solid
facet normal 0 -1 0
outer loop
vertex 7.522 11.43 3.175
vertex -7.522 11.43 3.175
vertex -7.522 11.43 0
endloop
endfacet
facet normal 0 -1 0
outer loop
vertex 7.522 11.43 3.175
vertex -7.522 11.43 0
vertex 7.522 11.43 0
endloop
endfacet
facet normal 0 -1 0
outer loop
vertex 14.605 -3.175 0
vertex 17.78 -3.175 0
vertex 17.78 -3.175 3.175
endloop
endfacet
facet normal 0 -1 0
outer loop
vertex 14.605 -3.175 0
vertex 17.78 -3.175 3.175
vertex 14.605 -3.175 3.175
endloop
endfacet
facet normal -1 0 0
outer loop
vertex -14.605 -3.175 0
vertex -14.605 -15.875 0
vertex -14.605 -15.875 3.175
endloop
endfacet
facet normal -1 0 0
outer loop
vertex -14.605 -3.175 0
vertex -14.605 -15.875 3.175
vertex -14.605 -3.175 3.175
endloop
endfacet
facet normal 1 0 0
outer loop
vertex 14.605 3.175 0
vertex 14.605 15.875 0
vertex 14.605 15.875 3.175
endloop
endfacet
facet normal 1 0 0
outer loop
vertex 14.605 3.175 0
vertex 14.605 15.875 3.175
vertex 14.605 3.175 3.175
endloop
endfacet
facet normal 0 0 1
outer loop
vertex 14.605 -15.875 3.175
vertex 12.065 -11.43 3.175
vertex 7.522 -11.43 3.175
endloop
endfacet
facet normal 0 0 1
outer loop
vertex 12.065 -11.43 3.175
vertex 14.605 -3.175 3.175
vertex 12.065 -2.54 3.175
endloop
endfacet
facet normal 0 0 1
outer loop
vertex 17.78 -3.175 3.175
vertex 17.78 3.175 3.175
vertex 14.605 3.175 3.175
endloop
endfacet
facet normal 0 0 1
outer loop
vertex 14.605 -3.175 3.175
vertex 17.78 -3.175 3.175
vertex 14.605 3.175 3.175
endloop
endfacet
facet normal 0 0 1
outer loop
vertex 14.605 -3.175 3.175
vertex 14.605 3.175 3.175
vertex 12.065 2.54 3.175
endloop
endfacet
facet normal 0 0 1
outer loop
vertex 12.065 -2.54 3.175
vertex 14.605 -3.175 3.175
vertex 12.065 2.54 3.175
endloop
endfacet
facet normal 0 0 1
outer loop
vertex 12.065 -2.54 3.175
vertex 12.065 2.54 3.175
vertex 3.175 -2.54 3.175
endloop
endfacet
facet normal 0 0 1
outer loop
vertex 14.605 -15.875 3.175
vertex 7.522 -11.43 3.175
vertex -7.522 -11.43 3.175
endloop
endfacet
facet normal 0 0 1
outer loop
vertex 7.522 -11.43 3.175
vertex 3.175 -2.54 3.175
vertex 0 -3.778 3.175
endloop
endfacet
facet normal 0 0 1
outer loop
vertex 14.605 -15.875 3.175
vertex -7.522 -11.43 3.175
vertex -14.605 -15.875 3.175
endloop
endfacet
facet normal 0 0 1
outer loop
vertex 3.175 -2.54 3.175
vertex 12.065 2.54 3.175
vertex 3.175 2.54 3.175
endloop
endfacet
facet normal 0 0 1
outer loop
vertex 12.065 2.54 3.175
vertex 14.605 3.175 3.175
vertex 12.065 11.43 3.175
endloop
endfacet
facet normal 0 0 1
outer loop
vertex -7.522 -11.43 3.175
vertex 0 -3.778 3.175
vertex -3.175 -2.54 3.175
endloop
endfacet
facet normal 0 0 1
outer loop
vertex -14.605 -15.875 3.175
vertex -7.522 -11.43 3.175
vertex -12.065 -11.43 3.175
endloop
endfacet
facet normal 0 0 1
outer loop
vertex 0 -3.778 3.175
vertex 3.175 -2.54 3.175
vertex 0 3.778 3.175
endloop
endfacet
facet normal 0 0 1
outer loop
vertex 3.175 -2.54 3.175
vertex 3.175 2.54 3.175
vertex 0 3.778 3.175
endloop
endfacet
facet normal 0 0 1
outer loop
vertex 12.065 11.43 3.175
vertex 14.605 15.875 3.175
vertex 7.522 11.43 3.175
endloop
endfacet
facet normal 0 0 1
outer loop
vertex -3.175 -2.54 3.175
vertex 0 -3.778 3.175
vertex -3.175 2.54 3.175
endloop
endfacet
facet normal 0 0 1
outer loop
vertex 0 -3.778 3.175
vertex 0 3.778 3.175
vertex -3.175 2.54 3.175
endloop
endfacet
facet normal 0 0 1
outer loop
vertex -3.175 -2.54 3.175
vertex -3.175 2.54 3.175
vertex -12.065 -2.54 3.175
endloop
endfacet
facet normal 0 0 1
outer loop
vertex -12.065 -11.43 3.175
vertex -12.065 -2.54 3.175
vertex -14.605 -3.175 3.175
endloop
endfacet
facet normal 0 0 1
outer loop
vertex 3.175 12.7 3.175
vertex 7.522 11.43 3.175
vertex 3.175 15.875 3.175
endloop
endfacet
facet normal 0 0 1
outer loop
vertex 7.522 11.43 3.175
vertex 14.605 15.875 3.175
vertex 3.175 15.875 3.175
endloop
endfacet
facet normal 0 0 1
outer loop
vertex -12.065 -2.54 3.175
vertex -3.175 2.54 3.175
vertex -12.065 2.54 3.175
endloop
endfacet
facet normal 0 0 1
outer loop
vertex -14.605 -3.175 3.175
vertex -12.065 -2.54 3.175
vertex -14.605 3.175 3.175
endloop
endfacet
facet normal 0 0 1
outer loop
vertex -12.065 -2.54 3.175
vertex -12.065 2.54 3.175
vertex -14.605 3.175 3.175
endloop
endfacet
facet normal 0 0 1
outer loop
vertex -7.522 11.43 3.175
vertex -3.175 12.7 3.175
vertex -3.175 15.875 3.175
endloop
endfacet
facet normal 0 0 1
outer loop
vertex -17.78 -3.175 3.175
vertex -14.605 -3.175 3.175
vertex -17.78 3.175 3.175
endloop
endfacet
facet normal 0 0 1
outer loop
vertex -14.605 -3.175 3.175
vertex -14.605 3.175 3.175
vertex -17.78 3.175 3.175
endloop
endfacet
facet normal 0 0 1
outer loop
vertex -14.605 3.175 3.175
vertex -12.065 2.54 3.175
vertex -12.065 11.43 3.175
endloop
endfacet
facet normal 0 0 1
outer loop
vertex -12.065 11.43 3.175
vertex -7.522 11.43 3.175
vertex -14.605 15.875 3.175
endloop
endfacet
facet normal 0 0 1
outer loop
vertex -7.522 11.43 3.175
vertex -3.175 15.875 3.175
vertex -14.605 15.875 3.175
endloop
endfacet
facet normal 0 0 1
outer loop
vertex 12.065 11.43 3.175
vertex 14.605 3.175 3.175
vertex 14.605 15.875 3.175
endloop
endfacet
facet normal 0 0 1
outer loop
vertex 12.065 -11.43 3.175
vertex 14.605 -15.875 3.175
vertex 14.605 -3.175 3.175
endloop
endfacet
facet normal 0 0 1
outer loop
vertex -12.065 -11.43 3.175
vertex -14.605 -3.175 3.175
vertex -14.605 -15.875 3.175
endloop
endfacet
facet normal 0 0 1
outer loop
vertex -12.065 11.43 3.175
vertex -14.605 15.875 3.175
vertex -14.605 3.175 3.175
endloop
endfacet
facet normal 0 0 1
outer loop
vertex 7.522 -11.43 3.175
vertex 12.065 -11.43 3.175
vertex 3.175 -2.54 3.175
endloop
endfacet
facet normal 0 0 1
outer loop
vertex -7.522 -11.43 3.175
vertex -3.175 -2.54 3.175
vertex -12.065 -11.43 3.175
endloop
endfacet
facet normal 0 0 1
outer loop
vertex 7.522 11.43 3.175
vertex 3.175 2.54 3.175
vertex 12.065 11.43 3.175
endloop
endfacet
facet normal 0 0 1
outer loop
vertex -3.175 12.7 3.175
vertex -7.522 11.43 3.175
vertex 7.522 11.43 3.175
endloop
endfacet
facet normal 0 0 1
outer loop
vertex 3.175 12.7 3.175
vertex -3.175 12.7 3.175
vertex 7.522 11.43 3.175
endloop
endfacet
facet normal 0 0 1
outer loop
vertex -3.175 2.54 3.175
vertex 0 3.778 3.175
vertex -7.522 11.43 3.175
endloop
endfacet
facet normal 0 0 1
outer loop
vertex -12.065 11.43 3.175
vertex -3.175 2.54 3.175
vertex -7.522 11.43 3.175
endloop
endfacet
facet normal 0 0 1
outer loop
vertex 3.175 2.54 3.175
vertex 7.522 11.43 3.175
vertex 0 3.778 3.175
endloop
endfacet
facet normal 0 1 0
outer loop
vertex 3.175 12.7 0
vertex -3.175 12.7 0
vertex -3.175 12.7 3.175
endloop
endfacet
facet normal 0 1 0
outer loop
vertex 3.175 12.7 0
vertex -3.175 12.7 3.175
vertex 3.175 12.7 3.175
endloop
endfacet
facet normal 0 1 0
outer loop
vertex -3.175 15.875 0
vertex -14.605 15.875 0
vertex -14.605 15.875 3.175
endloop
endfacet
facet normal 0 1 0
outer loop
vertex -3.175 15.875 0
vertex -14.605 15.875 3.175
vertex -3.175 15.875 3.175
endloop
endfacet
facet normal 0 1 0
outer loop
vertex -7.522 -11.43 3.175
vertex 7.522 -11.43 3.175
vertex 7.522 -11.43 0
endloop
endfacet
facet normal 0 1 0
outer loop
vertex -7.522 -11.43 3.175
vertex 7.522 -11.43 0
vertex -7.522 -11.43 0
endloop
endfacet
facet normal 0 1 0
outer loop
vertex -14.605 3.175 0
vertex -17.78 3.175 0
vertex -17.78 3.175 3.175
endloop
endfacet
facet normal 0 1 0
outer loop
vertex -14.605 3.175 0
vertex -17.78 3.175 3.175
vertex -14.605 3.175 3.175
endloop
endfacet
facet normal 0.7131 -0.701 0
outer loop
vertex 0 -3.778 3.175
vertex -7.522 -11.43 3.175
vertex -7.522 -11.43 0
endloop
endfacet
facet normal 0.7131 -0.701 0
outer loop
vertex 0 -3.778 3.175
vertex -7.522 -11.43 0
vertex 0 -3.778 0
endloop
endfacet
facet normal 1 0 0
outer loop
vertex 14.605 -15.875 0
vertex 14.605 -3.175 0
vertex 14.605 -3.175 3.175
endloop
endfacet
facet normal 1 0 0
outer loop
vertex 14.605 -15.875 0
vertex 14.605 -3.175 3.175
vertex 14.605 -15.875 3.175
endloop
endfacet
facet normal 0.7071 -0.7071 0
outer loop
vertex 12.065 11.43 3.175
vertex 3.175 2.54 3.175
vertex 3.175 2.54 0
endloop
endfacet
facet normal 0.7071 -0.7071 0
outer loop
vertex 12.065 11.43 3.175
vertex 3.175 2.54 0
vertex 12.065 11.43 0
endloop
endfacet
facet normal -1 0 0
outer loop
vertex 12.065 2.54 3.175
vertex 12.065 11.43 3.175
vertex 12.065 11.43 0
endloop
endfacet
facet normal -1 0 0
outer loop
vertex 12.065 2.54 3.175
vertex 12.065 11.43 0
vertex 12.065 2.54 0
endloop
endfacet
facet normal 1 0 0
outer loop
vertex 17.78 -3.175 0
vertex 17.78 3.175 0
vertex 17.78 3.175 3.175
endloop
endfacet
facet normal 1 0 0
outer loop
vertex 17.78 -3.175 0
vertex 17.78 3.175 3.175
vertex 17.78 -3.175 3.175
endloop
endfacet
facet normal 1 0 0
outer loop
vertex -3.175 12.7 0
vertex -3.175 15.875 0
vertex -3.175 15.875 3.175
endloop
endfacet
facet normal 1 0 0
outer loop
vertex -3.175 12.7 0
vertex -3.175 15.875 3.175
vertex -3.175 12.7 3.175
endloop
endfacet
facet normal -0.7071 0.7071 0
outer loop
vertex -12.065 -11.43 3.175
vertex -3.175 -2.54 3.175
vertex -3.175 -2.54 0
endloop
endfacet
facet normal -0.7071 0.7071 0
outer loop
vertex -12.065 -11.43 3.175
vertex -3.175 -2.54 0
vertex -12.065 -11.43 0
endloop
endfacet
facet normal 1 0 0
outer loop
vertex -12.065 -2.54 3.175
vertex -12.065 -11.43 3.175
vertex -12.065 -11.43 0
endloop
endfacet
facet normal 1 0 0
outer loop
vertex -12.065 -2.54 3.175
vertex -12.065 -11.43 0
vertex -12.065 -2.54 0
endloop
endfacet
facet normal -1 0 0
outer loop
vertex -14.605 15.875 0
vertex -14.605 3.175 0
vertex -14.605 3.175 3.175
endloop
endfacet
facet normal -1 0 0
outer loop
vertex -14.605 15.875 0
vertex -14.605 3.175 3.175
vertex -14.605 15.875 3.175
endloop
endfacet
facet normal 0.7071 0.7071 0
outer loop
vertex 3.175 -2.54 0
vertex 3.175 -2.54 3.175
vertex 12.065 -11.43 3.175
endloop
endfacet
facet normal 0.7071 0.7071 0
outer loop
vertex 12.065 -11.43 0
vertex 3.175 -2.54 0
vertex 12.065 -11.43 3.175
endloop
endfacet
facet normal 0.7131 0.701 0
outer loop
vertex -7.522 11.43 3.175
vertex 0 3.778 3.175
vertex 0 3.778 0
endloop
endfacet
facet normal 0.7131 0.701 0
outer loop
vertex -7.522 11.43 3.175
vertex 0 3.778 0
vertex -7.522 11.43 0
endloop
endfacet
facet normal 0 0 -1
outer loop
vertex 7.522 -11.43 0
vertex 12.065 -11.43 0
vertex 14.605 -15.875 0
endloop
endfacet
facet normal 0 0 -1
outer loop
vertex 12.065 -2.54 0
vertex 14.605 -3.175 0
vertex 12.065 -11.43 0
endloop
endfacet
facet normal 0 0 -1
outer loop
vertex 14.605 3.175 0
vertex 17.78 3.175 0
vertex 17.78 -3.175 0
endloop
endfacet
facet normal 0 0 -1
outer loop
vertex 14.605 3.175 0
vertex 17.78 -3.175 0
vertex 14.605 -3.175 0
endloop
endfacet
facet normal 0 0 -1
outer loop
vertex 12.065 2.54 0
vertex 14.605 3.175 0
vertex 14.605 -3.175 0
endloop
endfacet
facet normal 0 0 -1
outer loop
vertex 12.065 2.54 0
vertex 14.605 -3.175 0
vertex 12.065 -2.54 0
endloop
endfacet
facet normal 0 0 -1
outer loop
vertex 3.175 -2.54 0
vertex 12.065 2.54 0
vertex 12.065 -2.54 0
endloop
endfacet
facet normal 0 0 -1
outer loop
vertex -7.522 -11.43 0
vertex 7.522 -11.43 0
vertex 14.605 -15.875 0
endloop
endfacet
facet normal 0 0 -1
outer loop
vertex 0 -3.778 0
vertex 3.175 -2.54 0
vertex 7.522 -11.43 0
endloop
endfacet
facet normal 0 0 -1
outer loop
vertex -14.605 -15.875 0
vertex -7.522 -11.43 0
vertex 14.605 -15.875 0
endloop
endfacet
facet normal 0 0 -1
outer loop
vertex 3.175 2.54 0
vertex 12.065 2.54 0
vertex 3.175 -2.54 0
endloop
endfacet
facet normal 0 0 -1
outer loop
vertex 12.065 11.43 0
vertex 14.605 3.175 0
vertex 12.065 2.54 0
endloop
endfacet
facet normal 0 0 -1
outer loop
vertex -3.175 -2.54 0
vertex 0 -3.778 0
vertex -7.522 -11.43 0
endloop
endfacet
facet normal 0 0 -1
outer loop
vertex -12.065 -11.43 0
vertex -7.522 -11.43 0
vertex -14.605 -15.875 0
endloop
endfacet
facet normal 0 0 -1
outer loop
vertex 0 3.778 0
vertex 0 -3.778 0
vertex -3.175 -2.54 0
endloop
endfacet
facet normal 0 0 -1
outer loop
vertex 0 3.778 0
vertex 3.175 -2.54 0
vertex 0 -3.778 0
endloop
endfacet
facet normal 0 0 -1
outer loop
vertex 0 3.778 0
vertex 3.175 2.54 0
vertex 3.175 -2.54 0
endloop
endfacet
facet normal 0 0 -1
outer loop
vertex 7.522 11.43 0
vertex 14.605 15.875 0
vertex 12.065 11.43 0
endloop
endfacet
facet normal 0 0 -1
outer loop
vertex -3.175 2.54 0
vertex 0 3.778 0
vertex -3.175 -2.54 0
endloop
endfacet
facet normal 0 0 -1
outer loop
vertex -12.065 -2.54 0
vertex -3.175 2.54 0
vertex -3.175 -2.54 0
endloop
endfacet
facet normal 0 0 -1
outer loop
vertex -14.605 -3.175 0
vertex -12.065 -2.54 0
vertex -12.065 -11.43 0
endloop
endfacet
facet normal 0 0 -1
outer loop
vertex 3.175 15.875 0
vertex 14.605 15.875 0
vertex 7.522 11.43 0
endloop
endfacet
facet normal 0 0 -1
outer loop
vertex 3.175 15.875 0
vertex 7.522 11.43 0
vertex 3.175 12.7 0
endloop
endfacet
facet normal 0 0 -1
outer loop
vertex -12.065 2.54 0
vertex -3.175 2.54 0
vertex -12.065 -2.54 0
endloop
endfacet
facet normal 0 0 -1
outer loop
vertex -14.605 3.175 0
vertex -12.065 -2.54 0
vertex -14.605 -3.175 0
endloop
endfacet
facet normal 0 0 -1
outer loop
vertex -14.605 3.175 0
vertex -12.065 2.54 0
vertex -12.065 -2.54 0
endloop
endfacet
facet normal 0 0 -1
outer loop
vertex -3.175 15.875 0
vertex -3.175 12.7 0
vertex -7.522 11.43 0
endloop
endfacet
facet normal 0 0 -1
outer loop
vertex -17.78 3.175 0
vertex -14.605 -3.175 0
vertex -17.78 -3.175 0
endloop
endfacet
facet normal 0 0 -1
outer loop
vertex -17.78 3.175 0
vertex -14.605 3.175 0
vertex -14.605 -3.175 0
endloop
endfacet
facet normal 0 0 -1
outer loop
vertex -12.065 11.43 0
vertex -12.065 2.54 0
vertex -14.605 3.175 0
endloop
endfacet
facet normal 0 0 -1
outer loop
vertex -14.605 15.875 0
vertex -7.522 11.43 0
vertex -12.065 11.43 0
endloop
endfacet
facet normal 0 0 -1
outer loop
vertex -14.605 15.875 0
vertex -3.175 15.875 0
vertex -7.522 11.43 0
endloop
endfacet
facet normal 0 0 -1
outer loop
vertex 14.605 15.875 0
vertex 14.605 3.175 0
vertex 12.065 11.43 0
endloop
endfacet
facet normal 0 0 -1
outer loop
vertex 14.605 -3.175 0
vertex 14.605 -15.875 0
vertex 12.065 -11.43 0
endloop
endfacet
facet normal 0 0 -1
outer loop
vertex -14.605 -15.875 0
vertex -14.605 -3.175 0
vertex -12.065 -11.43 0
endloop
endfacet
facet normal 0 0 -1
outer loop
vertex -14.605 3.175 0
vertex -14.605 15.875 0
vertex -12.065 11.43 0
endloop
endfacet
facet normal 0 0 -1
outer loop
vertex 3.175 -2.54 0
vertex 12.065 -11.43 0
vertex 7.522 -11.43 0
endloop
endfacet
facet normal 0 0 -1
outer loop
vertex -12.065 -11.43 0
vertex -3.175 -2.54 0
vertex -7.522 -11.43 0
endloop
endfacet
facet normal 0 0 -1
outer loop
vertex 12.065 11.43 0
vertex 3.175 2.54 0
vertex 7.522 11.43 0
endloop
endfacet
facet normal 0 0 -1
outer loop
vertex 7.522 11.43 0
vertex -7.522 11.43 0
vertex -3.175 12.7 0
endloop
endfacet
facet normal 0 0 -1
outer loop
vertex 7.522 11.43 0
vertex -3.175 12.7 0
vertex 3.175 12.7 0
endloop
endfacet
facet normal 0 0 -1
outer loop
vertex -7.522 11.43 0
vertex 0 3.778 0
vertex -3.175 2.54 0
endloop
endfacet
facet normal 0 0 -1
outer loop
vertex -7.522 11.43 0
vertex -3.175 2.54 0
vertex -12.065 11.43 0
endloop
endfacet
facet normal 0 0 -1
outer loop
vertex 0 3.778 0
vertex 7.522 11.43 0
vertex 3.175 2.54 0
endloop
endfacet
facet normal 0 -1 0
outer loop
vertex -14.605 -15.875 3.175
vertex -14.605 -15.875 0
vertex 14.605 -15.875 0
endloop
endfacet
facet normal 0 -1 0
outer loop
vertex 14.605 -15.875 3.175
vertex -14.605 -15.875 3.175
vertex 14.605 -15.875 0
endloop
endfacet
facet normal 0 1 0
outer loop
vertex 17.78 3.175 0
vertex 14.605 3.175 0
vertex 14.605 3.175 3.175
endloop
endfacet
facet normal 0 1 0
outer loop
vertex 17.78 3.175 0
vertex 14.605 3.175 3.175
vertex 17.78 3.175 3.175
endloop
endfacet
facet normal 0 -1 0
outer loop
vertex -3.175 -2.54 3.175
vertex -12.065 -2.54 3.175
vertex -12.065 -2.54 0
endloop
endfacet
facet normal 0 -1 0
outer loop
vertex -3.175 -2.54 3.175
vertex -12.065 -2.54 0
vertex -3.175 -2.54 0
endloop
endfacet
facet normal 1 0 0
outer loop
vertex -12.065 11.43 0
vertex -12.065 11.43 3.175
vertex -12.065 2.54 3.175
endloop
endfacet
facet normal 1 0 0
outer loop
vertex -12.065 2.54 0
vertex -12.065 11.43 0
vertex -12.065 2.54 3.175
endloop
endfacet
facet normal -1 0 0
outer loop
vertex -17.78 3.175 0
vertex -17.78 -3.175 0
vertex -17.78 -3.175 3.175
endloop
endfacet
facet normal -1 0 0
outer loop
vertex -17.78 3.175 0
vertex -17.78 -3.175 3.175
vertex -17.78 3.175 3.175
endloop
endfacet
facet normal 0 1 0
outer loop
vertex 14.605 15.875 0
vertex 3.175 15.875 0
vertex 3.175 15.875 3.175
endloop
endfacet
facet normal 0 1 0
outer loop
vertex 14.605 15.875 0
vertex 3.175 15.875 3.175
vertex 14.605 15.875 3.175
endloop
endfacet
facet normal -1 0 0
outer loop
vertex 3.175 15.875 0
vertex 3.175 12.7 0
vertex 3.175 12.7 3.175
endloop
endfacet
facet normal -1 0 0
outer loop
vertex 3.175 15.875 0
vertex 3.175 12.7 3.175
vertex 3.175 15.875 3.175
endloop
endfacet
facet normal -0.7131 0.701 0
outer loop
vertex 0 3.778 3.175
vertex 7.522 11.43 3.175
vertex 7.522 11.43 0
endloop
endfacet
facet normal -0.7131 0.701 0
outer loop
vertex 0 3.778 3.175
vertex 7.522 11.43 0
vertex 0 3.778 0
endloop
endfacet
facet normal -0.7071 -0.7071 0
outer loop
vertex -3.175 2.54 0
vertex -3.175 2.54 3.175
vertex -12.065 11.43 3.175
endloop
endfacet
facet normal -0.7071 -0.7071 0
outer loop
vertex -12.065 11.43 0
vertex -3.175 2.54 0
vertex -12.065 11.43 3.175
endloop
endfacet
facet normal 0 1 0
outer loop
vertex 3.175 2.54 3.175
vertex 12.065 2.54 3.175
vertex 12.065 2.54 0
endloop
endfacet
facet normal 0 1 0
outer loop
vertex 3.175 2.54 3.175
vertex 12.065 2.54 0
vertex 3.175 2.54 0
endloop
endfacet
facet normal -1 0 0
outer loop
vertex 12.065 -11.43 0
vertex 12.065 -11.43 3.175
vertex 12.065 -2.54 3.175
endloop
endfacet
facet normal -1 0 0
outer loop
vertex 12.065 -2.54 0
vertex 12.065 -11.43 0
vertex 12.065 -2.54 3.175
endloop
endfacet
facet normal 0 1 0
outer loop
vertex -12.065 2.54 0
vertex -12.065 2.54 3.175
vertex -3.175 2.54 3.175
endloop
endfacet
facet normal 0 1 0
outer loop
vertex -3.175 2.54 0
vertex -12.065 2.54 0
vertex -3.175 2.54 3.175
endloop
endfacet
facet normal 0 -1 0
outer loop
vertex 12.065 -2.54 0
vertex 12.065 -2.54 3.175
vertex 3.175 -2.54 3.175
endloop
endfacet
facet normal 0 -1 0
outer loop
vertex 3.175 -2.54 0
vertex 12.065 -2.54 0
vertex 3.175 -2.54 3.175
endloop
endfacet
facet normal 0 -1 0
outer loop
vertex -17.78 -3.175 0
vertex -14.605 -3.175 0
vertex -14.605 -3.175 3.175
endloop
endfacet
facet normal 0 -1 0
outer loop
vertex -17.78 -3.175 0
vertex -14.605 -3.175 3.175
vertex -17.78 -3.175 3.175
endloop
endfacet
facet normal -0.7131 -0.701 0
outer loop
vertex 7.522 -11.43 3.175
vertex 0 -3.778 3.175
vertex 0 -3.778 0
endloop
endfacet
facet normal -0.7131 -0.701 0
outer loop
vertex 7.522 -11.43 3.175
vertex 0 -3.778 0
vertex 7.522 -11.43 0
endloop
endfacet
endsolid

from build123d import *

# Parameters (mm, degrees)
EXTRUDE1_DEPTH     = 3.175
CUT_EXTRUDE1_REACH = 5.175


with BuildPart() as part:
    # Sketch1 → Extrude1 (new body)
    with BuildSketch(Plane.XY):
        Polygon((-14.605, 15.875), (-3.175, 15.875), (-3.175, 12.7), (3.175, 12.7), (3.175, 15.875), (14.605, 15.875), (14.605, 3.175), (17.78, 3.175), (17.78, -3.175), (14.605, -3.175), (14.605, -15.875), (3.175, -15.875), (-3.175, -15.875), (-14.605, -15.875), (-14.605, -3.175), (-17.78, -3.175), (-17.78, 3.175), (-14.605, 3.175), align=None)
    extrude(amount=EXTRUDE1_DEPTH)

    # Sketch2 → Cut-Extrude1 (cut, up to next)
    with BuildSketch(Plane.XY.offset(3.175), mode=Mode.PRIVATE) as cut_extrude1_sk1:
        Polygon((3.175, 2.54), (12.065, 11.43), (12.065, 2.54), align=None)
    cut_extrude1_tool1 = extrude(cut_extrude1_sk1.sketch, amount=-CUT_EXTRUDE1_REACH, mode=Mode.PRIVATE) & part.part
    add(cut_extrude1_tool1.solids().sort_by_distance((9.101667, 5.503333, 3.175))[0], mode=Mode.SUBTRACT)
    # Sketch2 → Cut-Extrude1 (cut, up to next)
    with BuildSketch(Plane.XY.offset(3.175), mode=Mode.PRIVATE) as cut_extrude1_sk2:
        Polygon((-12.065, 2.54), (-3.175, 2.54), (-12.065, 11.43), align=None)
    cut_extrude1_tool2 = extrude(cut_extrude1_sk2.sketch, amount=-CUT_EXTRUDE1_REACH, mode=Mode.PRIVATE) & part.part
    add(cut_extrude1_tool2.solids().sort_by_distance((-9.101667, 5.503333, 3.175))[0], mode=Mode.SUBTRACT)
    # Sketch2 → Cut-Extrude1 (cut, up to next)
    with BuildSketch(Plane.XY.offset(3.175), mode=Mode.PRIVATE) as cut_extrude1_sk3:
        Polygon((-3.175, -2.54), (-12.065, -11.43), (-12.065, -2.54), align=None)
    cut_extrude1_tool3 = extrude(cut_extrude1_sk3.sketch, amount=-CUT_EXTRUDE1_REACH, mode=Mode.PRIVATE) & part.part
    add(cut_extrude1_tool3.solids().sort_by_distance((-9.101667, -5.503333, 3.175))[0], mode=Mode.SUBTRACT)
    # Sketch2 → Cut-Extrude1 (cut, up to next)
    with BuildSketch(Plane.XY.offset(3.175), mode=Mode.PRIVATE) as cut_extrude1_sk4:
        Polygon((12.065, -2.54), (3.175, -2.54), (12.065, -11.43), align=None)
    cut_extrude1_tool4 = extrude(cut_extrude1_sk4.sketch, amount=-CUT_EXTRUDE1_REACH, mode=Mode.PRIVATE) & part.part
    add(cut_extrude1_tool4.solids().sort_by_distance((9.101667, -5.503333, 3.175))[0], mode=Mode.SUBTRACT)
    # Sketch2 → Cut-Extrude1 (cut, up to next)
    with BuildSketch(Plane.XY.offset(3.175), mode=Mode.PRIVATE) as cut_extrude1_sk5:
        Polygon((-7.522107489, 11.43), (7.522107489, 11.43), (0, 3.778290122), align=None)
    cut_extrude1_tool5 = extrude(cut_extrude1_sk5.sketch, amount=-CUT_EXTRUDE1_REACH, mode=Mode.PRIVATE) & part.part
    add(cut_extrude1_tool5.solids().sort_by_distance((0, 8.87943, 3.175))[0], mode=Mode.SUBTRACT)
    # Sketch2 → Cut-Extrude1 (cut, up to next)
    with BuildSketch(Plane.XY.offset(3.175), mode=Mode.PRIVATE) as cut_extrude1_sk6:
        Polygon((0, -3.778290122), (7.522107489, -11.43), (-7.522107489, -11.43), align=None)
    cut_extrude1_tool6 = extrude(cut_extrude1_sk6.sketch, amount=-CUT_EXTRUDE1_REACH, mode=Mode.PRIVATE) & part.part
    add(cut_extrude1_tool6.solids().sort_by_distance((0, -8.87943, 3.175))[0], mode=Mode.SUBTRACT)


solid = part.part
